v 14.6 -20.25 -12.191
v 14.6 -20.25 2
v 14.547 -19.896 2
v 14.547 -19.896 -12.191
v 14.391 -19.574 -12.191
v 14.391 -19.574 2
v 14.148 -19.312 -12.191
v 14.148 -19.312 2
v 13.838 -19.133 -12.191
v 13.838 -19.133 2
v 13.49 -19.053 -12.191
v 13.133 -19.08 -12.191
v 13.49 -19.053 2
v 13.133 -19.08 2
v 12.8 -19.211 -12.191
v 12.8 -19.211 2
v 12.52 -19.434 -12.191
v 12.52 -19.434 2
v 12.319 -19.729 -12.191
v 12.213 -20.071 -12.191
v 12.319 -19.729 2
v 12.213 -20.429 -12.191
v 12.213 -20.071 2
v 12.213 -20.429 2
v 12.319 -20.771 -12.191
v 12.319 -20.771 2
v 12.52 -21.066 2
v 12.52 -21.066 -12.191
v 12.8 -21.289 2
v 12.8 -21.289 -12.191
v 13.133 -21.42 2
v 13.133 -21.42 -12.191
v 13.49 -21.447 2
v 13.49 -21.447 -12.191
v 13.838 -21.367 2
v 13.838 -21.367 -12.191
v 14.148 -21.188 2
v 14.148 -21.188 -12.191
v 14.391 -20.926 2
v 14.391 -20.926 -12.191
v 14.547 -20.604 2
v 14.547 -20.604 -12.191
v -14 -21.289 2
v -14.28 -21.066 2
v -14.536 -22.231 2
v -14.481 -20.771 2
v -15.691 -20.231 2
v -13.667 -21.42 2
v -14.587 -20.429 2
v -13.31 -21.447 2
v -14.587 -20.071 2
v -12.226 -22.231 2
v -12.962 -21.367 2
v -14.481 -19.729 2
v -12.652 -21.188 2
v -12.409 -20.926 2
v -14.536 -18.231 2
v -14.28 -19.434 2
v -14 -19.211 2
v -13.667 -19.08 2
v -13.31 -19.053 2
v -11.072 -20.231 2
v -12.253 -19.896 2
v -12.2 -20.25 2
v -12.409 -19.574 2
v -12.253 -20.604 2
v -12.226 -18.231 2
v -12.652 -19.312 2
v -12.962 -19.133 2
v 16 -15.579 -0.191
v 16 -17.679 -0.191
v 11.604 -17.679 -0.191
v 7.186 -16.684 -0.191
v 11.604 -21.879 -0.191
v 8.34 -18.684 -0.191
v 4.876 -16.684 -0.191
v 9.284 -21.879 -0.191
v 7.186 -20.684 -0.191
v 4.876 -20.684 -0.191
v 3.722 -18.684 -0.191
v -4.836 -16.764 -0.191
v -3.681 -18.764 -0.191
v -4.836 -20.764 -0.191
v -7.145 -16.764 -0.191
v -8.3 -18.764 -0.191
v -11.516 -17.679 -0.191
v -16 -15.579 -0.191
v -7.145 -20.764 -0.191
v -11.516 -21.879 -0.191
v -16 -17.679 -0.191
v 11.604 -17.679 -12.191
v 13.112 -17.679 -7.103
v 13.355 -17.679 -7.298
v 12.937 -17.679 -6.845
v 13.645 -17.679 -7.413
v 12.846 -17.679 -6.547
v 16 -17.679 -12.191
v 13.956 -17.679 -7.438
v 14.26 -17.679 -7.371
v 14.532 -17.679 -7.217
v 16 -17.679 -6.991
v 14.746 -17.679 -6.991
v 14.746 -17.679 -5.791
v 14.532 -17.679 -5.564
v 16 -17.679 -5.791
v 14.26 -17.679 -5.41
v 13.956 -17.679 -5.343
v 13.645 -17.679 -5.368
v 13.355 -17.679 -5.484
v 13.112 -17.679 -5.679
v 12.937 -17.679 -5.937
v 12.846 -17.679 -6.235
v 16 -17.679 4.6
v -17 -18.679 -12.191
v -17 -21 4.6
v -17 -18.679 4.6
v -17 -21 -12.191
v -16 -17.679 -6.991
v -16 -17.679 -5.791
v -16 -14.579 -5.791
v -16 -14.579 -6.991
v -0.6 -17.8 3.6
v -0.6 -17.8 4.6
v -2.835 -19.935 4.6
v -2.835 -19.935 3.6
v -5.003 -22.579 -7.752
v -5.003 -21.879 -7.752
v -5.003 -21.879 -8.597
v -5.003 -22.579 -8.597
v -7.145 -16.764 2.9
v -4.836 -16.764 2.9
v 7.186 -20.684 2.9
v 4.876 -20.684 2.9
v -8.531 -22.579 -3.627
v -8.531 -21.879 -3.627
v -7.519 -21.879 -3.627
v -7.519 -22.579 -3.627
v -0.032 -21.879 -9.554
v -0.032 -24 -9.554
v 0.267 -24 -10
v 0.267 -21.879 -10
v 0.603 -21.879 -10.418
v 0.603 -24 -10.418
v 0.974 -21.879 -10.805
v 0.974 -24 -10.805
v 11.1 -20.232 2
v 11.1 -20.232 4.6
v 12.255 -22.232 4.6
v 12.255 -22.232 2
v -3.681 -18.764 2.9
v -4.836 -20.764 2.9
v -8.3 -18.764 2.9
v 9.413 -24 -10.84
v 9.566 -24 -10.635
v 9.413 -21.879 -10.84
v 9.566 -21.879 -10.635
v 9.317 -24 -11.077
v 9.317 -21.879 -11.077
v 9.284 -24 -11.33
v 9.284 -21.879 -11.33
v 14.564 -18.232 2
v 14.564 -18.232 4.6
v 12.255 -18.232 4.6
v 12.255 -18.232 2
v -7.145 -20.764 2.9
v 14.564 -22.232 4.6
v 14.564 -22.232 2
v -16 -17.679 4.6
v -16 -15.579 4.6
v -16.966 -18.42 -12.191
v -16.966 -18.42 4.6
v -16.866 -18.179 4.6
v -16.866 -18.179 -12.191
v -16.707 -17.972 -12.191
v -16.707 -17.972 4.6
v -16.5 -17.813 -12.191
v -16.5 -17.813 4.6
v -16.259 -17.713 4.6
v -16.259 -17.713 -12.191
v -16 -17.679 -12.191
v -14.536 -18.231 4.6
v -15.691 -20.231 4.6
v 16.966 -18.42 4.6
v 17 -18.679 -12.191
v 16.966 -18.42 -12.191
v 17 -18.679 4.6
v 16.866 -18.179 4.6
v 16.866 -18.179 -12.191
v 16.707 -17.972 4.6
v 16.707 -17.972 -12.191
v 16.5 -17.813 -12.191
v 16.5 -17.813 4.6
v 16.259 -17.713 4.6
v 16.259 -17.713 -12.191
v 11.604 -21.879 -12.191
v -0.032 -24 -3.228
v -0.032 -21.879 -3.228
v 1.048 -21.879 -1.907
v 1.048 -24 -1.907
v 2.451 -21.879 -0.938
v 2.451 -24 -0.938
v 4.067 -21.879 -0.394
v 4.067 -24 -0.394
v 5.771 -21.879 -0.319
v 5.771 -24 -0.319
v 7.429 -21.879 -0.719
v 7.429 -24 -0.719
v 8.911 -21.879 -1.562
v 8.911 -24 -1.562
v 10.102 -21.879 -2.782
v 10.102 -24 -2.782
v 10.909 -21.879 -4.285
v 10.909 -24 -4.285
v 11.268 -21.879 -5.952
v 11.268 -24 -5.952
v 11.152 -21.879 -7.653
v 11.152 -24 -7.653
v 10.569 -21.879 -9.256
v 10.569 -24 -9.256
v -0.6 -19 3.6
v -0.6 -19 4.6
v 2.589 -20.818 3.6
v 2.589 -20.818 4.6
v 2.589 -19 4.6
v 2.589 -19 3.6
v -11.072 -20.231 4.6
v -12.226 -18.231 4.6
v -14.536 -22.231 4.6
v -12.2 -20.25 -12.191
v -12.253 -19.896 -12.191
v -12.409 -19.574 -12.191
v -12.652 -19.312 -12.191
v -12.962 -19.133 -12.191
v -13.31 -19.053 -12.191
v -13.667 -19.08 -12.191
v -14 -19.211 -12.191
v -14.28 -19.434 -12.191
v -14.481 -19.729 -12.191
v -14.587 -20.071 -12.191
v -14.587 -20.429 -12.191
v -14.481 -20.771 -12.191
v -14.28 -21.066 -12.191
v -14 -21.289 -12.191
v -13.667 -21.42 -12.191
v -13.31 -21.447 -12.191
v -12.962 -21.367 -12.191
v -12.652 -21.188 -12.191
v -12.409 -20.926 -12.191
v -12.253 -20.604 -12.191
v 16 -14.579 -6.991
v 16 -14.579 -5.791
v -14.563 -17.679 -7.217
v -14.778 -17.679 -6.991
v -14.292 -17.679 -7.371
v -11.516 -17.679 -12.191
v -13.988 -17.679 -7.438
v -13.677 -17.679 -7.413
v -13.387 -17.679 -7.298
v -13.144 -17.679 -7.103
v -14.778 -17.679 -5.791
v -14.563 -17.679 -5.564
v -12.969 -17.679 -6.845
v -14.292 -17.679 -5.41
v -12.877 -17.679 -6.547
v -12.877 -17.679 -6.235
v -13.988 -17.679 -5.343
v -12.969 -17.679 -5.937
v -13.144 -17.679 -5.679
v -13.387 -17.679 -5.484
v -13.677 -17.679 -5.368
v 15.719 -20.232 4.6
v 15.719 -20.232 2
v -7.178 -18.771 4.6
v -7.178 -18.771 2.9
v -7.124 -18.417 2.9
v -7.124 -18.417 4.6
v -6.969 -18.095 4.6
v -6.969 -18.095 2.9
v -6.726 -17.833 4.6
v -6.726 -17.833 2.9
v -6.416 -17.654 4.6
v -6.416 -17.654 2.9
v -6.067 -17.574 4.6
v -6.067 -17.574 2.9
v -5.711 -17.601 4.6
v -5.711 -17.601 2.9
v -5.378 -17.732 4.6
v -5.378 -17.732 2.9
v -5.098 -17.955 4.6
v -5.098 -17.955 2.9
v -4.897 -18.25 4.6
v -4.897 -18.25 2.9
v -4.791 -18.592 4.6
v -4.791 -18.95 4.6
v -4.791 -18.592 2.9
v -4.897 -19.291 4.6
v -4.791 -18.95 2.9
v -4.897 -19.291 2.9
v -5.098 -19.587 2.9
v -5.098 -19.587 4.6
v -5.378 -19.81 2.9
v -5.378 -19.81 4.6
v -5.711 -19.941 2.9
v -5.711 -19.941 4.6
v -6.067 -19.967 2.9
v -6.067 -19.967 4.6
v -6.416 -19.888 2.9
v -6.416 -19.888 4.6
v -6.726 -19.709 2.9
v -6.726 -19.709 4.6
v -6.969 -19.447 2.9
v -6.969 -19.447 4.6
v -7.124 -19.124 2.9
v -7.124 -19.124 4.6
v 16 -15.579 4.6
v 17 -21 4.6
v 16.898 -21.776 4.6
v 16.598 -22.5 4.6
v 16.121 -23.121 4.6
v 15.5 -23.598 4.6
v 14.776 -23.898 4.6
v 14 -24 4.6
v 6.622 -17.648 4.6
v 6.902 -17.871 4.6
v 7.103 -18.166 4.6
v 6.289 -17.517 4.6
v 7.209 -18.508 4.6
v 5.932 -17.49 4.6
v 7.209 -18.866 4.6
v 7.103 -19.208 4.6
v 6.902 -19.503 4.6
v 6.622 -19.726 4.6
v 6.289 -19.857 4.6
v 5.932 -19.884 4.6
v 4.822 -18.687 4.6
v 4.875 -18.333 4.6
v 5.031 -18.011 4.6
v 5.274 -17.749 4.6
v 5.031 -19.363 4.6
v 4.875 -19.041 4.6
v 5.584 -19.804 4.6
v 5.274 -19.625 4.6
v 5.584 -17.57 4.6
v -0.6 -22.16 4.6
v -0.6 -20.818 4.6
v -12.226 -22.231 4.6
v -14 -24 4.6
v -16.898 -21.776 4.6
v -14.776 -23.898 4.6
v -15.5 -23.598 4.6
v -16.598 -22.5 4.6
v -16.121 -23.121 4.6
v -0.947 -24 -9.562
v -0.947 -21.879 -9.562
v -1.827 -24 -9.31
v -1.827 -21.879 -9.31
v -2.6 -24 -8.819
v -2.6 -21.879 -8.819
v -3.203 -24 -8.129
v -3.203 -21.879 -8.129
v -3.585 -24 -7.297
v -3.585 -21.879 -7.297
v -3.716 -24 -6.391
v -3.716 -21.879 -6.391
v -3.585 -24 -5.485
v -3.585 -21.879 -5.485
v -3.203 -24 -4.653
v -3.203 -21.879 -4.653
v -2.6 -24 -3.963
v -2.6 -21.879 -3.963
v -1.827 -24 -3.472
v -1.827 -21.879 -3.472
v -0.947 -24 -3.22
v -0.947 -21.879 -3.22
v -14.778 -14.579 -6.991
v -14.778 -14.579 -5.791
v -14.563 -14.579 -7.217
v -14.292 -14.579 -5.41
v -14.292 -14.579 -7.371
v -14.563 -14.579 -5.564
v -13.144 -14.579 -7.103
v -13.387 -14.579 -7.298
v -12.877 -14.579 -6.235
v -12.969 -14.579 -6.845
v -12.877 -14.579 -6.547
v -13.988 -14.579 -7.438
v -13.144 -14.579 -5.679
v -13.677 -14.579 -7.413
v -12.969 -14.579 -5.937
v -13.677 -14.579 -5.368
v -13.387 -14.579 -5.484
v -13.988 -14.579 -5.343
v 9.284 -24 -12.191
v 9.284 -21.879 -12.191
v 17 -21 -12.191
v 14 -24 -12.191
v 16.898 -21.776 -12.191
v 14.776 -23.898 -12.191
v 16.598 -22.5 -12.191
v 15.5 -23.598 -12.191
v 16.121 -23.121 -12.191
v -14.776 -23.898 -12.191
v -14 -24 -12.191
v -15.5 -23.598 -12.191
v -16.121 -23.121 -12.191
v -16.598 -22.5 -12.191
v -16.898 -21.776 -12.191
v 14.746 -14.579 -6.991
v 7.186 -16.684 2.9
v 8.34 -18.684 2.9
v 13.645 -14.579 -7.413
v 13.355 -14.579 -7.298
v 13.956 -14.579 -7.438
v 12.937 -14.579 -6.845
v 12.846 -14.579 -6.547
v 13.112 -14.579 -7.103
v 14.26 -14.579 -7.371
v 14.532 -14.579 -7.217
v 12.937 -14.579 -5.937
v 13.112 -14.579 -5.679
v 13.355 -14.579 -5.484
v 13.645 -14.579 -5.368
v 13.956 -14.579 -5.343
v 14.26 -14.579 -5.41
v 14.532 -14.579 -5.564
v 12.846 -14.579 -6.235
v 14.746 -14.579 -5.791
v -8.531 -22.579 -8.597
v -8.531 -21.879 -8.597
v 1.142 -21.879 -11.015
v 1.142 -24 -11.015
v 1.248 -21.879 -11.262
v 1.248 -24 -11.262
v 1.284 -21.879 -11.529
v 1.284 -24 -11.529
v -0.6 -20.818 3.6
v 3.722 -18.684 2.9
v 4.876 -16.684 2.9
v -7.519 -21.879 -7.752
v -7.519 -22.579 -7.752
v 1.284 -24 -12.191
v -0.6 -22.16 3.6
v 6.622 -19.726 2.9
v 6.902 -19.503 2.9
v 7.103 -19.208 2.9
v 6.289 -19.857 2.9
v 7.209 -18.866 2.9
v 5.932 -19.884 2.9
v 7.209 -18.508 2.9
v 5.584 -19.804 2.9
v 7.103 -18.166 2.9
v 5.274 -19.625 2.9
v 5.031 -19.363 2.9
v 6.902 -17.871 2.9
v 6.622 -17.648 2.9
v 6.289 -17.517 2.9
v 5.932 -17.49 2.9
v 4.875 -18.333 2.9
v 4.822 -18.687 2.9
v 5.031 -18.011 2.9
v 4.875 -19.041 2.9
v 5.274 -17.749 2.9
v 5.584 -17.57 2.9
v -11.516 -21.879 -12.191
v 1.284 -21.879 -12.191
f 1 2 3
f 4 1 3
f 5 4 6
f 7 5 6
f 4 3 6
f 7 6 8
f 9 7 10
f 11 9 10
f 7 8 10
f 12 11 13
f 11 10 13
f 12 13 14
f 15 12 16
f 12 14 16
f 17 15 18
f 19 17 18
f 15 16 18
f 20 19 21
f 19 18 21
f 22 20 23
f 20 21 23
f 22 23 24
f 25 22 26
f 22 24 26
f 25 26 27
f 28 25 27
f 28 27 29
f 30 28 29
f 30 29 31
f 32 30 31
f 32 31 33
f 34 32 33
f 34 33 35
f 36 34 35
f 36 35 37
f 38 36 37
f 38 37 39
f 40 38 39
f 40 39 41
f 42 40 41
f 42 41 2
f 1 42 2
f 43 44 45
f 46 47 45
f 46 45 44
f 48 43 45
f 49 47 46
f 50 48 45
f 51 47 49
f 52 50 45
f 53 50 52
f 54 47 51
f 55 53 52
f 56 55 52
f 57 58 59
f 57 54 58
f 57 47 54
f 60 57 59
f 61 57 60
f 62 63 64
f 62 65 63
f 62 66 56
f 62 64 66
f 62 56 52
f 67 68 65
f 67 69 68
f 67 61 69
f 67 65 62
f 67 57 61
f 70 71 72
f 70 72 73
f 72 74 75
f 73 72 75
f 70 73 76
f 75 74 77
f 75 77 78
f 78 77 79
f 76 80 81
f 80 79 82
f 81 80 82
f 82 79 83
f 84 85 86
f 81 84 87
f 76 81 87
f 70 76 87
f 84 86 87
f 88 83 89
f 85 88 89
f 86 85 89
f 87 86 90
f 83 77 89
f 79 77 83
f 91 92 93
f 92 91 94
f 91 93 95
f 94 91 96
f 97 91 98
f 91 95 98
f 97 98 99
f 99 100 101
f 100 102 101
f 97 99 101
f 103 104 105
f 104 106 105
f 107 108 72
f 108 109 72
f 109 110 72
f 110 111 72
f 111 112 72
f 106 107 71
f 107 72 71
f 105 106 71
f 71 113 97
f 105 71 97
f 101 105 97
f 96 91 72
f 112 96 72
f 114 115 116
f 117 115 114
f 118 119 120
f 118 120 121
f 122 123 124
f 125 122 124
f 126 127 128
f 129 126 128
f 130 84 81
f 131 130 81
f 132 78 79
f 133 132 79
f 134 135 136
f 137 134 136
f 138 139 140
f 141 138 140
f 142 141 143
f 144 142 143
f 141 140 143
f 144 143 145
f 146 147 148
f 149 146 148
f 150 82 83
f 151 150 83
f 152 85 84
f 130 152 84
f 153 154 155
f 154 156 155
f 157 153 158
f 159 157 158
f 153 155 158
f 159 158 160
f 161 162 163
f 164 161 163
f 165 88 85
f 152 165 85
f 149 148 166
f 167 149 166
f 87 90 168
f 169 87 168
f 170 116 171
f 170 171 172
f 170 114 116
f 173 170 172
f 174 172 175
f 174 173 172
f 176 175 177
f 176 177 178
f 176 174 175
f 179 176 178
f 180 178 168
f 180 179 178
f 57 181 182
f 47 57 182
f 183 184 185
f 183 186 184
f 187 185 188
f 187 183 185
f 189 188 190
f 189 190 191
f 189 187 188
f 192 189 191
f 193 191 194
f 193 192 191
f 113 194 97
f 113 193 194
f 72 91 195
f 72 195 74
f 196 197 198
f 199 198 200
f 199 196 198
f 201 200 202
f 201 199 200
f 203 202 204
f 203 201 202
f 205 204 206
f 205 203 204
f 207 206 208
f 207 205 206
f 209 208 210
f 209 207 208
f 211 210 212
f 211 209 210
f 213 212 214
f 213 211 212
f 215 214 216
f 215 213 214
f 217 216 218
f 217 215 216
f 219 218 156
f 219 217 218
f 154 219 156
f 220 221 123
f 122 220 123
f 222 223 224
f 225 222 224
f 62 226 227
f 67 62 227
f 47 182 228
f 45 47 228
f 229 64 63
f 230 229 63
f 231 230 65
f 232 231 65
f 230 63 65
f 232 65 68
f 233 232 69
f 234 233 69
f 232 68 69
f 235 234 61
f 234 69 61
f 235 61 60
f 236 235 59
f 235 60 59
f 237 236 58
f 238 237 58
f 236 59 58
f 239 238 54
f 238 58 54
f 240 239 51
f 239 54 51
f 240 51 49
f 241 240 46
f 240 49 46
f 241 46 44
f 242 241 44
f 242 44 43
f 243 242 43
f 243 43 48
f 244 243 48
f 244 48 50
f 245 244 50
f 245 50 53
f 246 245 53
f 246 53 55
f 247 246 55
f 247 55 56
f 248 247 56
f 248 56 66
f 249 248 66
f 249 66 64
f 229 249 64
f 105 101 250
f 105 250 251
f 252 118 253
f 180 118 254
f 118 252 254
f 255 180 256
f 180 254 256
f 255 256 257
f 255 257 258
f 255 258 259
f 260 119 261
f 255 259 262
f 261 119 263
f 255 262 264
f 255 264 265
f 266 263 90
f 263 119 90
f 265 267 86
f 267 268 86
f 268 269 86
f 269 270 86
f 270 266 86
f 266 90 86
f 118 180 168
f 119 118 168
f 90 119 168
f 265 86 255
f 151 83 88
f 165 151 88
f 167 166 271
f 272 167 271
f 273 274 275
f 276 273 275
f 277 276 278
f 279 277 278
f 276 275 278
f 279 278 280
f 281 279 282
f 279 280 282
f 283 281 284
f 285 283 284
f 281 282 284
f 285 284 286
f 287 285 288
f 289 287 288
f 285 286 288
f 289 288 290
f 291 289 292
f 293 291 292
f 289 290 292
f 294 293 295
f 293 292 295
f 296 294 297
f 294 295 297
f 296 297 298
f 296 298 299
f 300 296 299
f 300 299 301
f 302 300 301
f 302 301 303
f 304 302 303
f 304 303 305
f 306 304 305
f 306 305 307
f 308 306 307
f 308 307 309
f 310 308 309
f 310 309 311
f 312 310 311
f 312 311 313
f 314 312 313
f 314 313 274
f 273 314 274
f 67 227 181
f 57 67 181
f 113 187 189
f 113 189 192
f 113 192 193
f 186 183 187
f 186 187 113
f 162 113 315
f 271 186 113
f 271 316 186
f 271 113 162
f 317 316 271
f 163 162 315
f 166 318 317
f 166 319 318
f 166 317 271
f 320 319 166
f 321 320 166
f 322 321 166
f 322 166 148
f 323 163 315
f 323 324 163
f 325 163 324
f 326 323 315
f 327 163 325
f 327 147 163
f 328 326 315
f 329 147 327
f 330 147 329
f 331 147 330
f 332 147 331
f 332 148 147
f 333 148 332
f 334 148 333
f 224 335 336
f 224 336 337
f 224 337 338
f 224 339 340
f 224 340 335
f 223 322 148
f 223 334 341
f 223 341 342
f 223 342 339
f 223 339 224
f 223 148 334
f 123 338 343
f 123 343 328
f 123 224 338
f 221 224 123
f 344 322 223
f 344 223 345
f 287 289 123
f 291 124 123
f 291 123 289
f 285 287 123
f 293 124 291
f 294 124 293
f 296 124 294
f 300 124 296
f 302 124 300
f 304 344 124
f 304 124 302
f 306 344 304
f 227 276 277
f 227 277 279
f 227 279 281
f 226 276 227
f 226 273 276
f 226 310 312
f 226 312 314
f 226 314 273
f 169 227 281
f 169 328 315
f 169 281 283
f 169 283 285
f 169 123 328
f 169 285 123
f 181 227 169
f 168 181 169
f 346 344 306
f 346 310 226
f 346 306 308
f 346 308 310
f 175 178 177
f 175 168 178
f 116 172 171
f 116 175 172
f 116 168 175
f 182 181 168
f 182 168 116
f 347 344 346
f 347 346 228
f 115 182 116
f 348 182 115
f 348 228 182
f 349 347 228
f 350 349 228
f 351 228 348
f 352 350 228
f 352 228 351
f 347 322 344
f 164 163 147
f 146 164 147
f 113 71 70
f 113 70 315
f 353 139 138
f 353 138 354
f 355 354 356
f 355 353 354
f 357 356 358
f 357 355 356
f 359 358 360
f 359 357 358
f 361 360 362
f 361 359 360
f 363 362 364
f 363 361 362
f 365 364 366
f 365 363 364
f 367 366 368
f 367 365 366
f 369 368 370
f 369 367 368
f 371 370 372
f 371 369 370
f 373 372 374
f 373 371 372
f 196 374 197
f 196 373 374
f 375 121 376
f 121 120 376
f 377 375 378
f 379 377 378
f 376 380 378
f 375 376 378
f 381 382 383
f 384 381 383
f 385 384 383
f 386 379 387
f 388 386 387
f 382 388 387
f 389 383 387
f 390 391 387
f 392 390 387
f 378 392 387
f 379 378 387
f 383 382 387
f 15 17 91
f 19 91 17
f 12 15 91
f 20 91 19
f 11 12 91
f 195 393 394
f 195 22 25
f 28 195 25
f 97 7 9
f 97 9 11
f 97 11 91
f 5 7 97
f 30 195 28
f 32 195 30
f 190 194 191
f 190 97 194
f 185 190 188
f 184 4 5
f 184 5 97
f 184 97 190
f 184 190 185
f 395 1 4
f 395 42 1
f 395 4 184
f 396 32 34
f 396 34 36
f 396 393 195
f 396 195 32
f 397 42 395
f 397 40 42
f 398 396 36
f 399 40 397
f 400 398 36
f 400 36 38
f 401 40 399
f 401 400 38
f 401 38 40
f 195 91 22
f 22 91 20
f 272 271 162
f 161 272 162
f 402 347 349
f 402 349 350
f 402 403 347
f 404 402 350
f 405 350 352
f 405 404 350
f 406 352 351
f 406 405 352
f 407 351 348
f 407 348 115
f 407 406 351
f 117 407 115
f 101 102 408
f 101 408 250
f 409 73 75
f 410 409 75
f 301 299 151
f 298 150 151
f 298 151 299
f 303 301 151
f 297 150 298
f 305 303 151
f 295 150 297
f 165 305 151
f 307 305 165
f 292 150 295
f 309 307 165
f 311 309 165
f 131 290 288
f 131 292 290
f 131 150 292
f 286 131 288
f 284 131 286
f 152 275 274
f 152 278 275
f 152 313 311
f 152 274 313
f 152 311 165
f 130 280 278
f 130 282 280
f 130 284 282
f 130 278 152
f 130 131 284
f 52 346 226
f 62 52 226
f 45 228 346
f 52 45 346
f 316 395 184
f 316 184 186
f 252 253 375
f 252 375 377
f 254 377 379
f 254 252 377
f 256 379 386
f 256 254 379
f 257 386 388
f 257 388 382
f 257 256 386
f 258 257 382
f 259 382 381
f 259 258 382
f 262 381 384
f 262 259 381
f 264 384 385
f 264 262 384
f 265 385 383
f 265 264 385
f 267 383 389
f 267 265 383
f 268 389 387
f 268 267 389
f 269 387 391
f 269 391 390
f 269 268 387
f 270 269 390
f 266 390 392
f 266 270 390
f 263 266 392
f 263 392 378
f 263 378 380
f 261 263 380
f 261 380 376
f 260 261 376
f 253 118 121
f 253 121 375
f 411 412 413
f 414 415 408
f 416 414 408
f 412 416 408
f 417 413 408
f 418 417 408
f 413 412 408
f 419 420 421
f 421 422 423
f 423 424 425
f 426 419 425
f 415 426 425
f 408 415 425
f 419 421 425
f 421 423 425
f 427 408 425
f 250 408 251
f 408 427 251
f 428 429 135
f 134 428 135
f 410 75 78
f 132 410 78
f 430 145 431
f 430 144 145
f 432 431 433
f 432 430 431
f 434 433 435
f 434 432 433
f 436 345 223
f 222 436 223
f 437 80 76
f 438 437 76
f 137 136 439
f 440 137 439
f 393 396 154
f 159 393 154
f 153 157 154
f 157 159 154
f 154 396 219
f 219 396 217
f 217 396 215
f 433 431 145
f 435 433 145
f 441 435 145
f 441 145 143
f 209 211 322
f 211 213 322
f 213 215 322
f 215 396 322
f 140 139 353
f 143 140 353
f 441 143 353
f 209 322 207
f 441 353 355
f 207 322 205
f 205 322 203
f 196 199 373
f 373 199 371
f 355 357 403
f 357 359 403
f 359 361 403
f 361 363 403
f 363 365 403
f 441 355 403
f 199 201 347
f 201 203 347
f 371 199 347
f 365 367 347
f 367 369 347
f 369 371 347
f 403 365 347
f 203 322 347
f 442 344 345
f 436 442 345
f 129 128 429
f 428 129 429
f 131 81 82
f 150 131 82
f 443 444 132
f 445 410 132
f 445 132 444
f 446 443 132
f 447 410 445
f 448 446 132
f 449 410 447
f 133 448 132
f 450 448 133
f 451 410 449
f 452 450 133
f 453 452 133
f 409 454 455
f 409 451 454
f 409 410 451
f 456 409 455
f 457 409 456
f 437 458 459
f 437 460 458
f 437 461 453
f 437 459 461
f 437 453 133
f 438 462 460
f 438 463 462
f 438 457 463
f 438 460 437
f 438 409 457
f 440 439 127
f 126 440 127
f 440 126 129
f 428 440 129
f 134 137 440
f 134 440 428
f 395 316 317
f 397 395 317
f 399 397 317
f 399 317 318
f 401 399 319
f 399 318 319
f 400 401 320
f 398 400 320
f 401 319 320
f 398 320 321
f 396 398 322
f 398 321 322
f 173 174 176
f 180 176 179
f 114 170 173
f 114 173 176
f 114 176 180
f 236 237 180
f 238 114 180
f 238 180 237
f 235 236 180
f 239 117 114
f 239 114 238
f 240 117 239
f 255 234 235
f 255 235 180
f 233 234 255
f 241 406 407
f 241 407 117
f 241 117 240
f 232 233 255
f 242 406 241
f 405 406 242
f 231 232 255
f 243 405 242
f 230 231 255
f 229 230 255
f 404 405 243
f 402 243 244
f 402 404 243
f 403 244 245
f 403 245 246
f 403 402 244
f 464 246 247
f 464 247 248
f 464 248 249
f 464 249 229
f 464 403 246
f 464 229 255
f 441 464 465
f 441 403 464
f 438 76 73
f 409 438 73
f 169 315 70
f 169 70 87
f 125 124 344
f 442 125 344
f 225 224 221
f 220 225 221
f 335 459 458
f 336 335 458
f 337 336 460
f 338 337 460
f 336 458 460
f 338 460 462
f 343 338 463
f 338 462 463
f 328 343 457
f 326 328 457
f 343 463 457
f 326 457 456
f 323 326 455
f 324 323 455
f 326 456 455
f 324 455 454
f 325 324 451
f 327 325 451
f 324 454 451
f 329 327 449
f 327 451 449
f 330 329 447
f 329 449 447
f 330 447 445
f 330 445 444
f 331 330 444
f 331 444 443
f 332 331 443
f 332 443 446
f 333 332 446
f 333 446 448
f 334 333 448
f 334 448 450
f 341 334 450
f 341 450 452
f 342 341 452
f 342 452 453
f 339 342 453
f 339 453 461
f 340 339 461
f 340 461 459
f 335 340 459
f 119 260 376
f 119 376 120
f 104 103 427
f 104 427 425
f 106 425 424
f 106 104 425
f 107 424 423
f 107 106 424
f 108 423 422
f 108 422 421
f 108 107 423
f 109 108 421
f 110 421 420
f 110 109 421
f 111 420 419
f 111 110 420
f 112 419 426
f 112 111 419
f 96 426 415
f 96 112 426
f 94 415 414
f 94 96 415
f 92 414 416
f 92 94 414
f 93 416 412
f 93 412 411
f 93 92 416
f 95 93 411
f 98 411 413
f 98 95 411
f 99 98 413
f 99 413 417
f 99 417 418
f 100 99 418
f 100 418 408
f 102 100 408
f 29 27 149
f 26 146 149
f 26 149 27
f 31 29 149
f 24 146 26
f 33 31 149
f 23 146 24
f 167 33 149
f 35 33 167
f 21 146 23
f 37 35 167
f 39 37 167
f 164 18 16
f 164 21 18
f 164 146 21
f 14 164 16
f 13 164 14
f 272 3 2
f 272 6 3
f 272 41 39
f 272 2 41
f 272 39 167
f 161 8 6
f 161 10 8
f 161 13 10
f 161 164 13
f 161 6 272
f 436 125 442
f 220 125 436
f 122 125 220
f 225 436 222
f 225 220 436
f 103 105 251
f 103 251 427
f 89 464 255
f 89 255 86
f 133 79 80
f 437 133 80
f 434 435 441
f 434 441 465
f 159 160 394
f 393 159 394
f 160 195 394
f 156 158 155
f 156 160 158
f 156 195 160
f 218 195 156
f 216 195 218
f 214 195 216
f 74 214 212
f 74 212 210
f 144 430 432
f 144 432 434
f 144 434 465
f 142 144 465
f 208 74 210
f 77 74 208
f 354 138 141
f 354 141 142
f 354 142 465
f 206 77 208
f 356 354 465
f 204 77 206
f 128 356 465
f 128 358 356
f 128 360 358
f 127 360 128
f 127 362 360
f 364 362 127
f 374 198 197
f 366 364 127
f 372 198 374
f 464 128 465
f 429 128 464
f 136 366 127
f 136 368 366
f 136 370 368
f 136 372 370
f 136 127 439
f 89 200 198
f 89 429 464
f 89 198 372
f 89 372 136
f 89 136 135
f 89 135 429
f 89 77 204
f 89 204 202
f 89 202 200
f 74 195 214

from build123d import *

# Parameters (mm, degrees)
EXTRUDE_1_DEPTH     = 2.121152063
SKETCH_2_W          = 18.284159781
SKETCH_2_H          = 2.121152063
EXTRUDE_2_DEPTH     = 1.283615947
SKETCH_3_W          = 7.715840219
SKETCH_3_H          = 2.121152063
EXTRUDE_3_DEPTH     = 1.283615947
EXTRUDE_4_DEPTH     = 4.2
SKETCH_5_W          = 31.999368794
SKETCH_5_H          = 4.790748137
EXTRUDE_5_DEPTH     = 2.1
SKETCH_6_W          = 12.000251863
SKETCH_6_H          = 4.2
CUT_EXTRUDE_1_DEPTH = 2.32
CUT_EXTRUDE_2_DEPTH = 23.550749058
EXTRUDE_6_DEPTH     = 3.1
EXTRUDE_7_DEPTH     = 3.1
CUT_EXTRUDE_3_DEPTH = 1
CUT_EXTRUDE_4_DEPTH = 2.6
CUT_EXTRUDE_5_DEPTH = 2.6
CUT_EXTRUDE_6_DEPTH = 0.7
CUT_EXTRUDE_7_DEPTH = 3.090748137
CUT_EXTRUDE_8_DEPTH = 3.090748137
HOLE_WIZARD_1_D     = 2.4
HOLE_WIZARD_1_DEPTH = 16.79105
HOLE_WIZARD_2_D     = 2.4
HOLE_WIZARD_2_DEPTH = 16.79105
HOLE_WIZARD_3_D     = 2.4
HOLE_WIZARD_3_DEPTH = 16.79105
HOLE_WIZARD_4_D     = 2.4
HOLE_WIZARD_4_DEPTH = 16.79105
FILLET_1_R          = 1
FILLET_2_R          = 1
FILLET_3_R          = 1
FILLET_4_R          = 1
FILLET_5_R          = 3
FILLET_6_R          = 3


with BuildPart() as part:
    # ｽｹｯﾁ1 → ﾎﾞｽ - 押し出し1 (new body)
    with BuildSketch(Plane.XZ.offset(24)):
        with BuildLine():
            Line((-17, 4.6), (-17, -10.907384053))
            Line((-17, -10.907384053), (1.284159781, -10.907384053))
            Line((1.284159781, -10.907384053), (1.284159781, -9.036499448))
            ThreePointArc((1.284159781, -9.036499448), (-3.636777298, -7.097679354), (-0.031629692, -3.227594621))
            ThreePointArc((-0.031629692, -3.227594621), (9.064370854, -1.683948584), (9.284159781, -10.907384053))
            Line((9.284159781, -10.907384053), (17, -10.907384053))
            Line((17, -10.907384053), (17, 4.6))
            Line((17, 4.6), (-17, 4.6))
        make_face()
    extrude(amount=-EXTRUDE_1_DEPTH)

    # ｽｹｯﾁ2 → ﾎﾞｽ - 押し出し2 (add)
    with BuildSketch(Plane(origin=(0, 0, -10.907384053), x_dir=(-1, 0, 0), z_dir=(0, 0, -1))):
        with Locations((7.85792011, -22.939423969)):
            Rectangle(SKETCH_2_W, SKETCH_2_H)
    extrude(amount=EXTRUDE_2_DEPTH)

    # ｽｹｯﾁ3 → ﾎﾞｽ - 押し出し3 (add)
    with BuildSketch(Plane(origin=(0, 0, -10.907384053), x_dir=(-1, 0, 0), z_dir=(0, 0, -1))):
        with Locations((-13.14207989, -22.939423969)):
            Rectangle(SKETCH_3_W, SKETCH_3_H)
    extrude(amount=EXTRUDE_3_DEPTH)

    # ｽｹｯﾁ4 → ﾎﾞｽ - 押し出し4 (add)
    with BuildSketch(Plane(origin=(0, -21.878847937, 0), x_dir=(-1, 0, 0), z_dir=(0, 1, 0))):
        with BuildLine():
            Line((17, 4.6), (17, -12.191))
            Line((17, -12.191), (11.515840219, -12.191))
            Line((11.515840219, -12.191), (11.515840219, -0.190748137))
            Line((11.515840219, -0.190748137), (-9.284159781, -0.190748137))
            Line((-9.284159781, -0.190748137), (-9.284159781, -12.191))
            add(Edge.make_bspline(
                [(-9.284159781, -12.191), (-10.057493115, -12.191), (-10.830826448, -12.191), (-11.604159781, -12.191)],
                knots=[0, 0, 0, 0, 1, 1, 1, 1], degree=3))
            Line((-11.604159781, -12.191), (-17, -12.191))
            Line((-17, -12.191), (-17, 4.6))
            Line((-17, 4.6), (17, 4.6))
        make_face()
    extrude(amount=EXTRUDE_4_DEPTH)

    # ｽｹｯﾁ5 → ﾎﾞｽ - 押し出し5 (add)
    with BuildSketch(Plane(origin=(0, -17.678847937, 0), x_dir=(-1, 0, 0), z_dir=(0, 1, 0))):
        with Locations((-0.000159781, 2.204625932)):
            Rectangle(SKETCH_5_W, SKETCH_5_H)
    extrude(amount=EXTRUDE_5_DEPTH)

    # ｽｹｯﾁ6 → ｶｯﾄ - 押し出し1 (cut)
    with BuildSketch(Plane.ZY.offset(-9.284159781)):
        with Locations((-6.190874069, -19.778847937)):
            Rectangle(SKETCH_6_W, SKETCH_6_H)
    extrude(amount=-CUT_EXTRUDE_1_DEPTH, mode=Mode.SUBTRACT)

    # ｽｹｯﾁ7 → ｶｯﾄ - 押し出し2 (cut, through all)
    with BuildSketch(Plane.XZ.offset(24)):
        with BuildLine():
            Line((1.284159781, -11.081163897), (1.284159781, -9.036499448))
            ThreePointArc((1.284159781, -9.036499448), (0.655198078, -9.368779249), (-0.031629692, -9.553901653))
            ThreePointArc((-0.031629692, -9.553901653), (0.562738255, -10.37226331), (1.284159781, -11.081163897))
        make_face()
    extrude(amount=-CUT_EXTRUDE_2_DEPTH, mode=Mode.SUBTRACT)

    # ｽｹｯﾁ8 → ﾎﾞｽ - 押し出し6 (add)
    with BuildSketch(Plane(origin=(0, -17.678847937, 0), x_dir=(-1, 0, 0), z_dir=(0, 1, 0))):
        with BuildLine():
            Line((15.999524616, -6.990748137), (14.777524616, -6.990748137))
            ThreePointArc((14.777524616, -6.990748137), (12.865840219, -6.390748137), (14.777524616, -5.790748137))
            Line((14.777524616, -5.790748137), (15.999524616, -5.790748137))
            Line((15.999524616, -5.790748137), (15.999524616, -6.990748137))
        make_face()
    extrude(amount=EXTRUDE_6_DEPTH)

    # ｽｹｯﾁ9 → ﾎﾞｽ - 押し出し7 (add)
    with BuildSketch(Plane(origin=(0, -17.678847937, 0), x_dir=(-1, 0, 0), z_dir=(0, 1, 0))):
        with BuildLine():
            Line((-15.999844178, -5.790748137), (-14.745844178, -5.790748137))
            ThreePointArc((-14.745844178, -5.790748137), (-12.834159781, -6.390748137), (-14.745844178, -6.990748137))
            Line((-14.745844178, -6.990748137), (-15.999844178, -6.990748137))
            Line((-15.999844178, -6.990748137), (-15.999844178, -5.790748137))
        make_face()
    extrude(amount=EXTRUDE_7_DEPTH)

    # ｽｹｯﾁ10 → ｶｯﾄ - 押し出し3 (cut)
    with BuildSketch(Plane.XY.offset(4.6)):
        Polygon((-0.599999987, -17.799999602), (-2.834665696, -19.9353347), (-0.599999987, -22.159852817), (-0.599999987, -20.818248187), (2.589334329, -20.818248187), (2.589334329, -18.999999575), (-0.599999987, -18.999999575), align=None)
    extrude(amount=-CUT_EXTRUDE_3_DEPTH, mode=Mode.SUBTRACT)

    # ｽｹｯﾁ11 → ｶｯﾄ - 押し出し4 (cut)
    with BuildSketch(Plane.XY.offset(4.6)):
        Polygon((-14.535820787, -22.230633649), (-12.22641971, -22.230633649), (-11.071719172, -20.230633649), (-12.22641971, -18.230633649), (-14.535820787, -18.230633649), (-15.690521325, -20.230633649), align=None)
    extrude(amount=-CUT_EXTRUDE_4_DEPTH, mode=Mode.SUBTRACT)

    # ｽｹｯﾁ12 → ｶｯﾄ - 押し出し5 (cut)
    with BuildSketch(Plane.XY.offset(4.6)):
        Polygon((12.255035689, -22.231967066), (14.564436765, -22.231967066), (15.719137304, -20.231967066), (14.564436765, -18.231967066), (12.255035689, -18.231967066), (11.10033515, -20.231967066), align=None)
    extrude(amount=-CUT_EXTRUDE_5_DEPTH, mode=Mode.SUBTRACT)

    # ｽｹｯﾁ13 → ｶｯﾄ - 押し出し6 (cut)
    with BuildSketch(Plane(origin=(0, -21.878847937, 0), x_dir=(-1, 0, 0), z_dir=(0, 1, 0))):
        Polygon((7.518980495, -7.752475082), (5.003355584, -7.752475082), (5.003355584, -8.596713483), (8.530699304, -8.596713483), (8.530699304, -3.62698698), (7.518980495, -3.62698698), align=None)
    extrude(amount=-CUT_EXTRUDE_6_DEPTH, mode=Mode.SUBTRACT)

    # ｽｹｯﾁ14 → ｶｯﾄ - 押し出し7 (cut)
    with BuildSketch(Plane(origin=(0, 0, -0.190748137), x_dir=(-1, 0, 0), z_dir=(0, 0, -1))):
        Polygon((-7.185754105, -20.683997984), (-4.876353029, -20.683997984), (-3.72165249, -18.683997984), (-4.876353029, -16.683997984), (-7.185754105, -16.683997984), (-8.340454644, -18.683997984), align=None)
    extrude(amount=-CUT_EXTRUDE_7_DEPTH, mode=Mode.SUBTRACT)

    # ｽｹｯﾁ15 → ｶｯﾄ - 押し出し8 (cut)
    with BuildSketch(Plane(origin=(0, 0, -0.190748137), x_dir=(-1, 0, 0), z_dir=(0, 0, -1))):
        Polygon((4.835886318, -20.763995351), (7.145287395, -20.763995351), (8.299987933, -18.763995351), (7.145287395, -16.763995351), (4.835886318, -16.763995351), (3.68118578, -18.763995351), align=None)
    extrude(amount=-CUT_EXTRUDE_8_DEPTH, mode=Mode.SUBTRACT)

    # 穴1
    with Locations(Plane.XY.offset(4.6)):
        with Locations((-5.97769389, -18.770751676)):
            Hole(HOLE_WIZARD_1_D / 2, depth=HOLE_WIZARD_1_DEPTH)

    # 穴2
    with Locations(Plane.XY.offset(4.6)):
        with Locations((6.022013453, -18.686944197)):
            Hole(HOLE_WIZARD_2_D / 2, depth=HOLE_WIZARD_2_DEPTH)

    # 穴3
    with Locations(Plane(origin=(0, 0, -12.191), x_dir=(-1, 0, 0), z_dir=(0, 0, -1))):
        with Locations((-13.4, -20.25)):
            Hole(HOLE_WIZARD_3_D / 2, depth=HOLE_WIZARD_3_DEPTH)

    # 穴4
    with Locations(Plane(origin=(0, 0, -12.191), x_dir=(-1, 0, 0), z_dir=(0, 0, -1))):
        with Locations((13.4, -20.25)):
            Hole(HOLE_WIZARD_4_D / 2, depth=HOLE_WIZARD_4_DEPTH)

    # ﾌｨﾚｯﾄ1
    fillet_1_edges = [part.edges().sort_by_distance(p)[0] for p in [
        (9.284159781, -22.939423968, -10.907384053),
    ]]
    fillet(fillet_1_edges, radius=FILLET_1_R)

    # ﾌｨﾚｯﾄ2
    fillet_2_edges = [part.edges().sort_by_distance(p)[0] for p in [
        (1.284159781, -22.939423968, -11.081163897),
    ]]
    fillet(fillet_2_edges, radius=FILLET_2_R)

    # ﾌｨﾚｯﾄ3
    fillet_3_edges = [part.edges().sort_by_distance(p)[0] for p in [
        (-17, -17.678847937, -3.7955),
    ]]
    fillet(fillet_3_edges, radius=FILLET_3_R)

    # ﾌｨﾚｯﾄ4
    fillet_4_edges = [part.edges().sort_by_distance(p)[0] for p in [
        (17, -17.678847937, -3.7955),
    ]]
    fillet(fillet_4_edges, radius=FILLET_4_R)

    # ﾌｨﾚｯﾄ5
    fillet_5_edges = [part.edges().sort_by_distance(p)[0] for p in [
        (-17, -24, -3.7955),
    ]]
    fillet(fillet_5_edges, radius=FILLET_5_R)

    # ﾌｨﾚｯﾄ6
    fillet_6_edges = [part.edges().sort_by_distance(p)[0] for p in [
        (17, -24, -3.7955),
    ]]
    fillet(fillet_6_edges, radius=FILLET_6_R)


solid = part.part
